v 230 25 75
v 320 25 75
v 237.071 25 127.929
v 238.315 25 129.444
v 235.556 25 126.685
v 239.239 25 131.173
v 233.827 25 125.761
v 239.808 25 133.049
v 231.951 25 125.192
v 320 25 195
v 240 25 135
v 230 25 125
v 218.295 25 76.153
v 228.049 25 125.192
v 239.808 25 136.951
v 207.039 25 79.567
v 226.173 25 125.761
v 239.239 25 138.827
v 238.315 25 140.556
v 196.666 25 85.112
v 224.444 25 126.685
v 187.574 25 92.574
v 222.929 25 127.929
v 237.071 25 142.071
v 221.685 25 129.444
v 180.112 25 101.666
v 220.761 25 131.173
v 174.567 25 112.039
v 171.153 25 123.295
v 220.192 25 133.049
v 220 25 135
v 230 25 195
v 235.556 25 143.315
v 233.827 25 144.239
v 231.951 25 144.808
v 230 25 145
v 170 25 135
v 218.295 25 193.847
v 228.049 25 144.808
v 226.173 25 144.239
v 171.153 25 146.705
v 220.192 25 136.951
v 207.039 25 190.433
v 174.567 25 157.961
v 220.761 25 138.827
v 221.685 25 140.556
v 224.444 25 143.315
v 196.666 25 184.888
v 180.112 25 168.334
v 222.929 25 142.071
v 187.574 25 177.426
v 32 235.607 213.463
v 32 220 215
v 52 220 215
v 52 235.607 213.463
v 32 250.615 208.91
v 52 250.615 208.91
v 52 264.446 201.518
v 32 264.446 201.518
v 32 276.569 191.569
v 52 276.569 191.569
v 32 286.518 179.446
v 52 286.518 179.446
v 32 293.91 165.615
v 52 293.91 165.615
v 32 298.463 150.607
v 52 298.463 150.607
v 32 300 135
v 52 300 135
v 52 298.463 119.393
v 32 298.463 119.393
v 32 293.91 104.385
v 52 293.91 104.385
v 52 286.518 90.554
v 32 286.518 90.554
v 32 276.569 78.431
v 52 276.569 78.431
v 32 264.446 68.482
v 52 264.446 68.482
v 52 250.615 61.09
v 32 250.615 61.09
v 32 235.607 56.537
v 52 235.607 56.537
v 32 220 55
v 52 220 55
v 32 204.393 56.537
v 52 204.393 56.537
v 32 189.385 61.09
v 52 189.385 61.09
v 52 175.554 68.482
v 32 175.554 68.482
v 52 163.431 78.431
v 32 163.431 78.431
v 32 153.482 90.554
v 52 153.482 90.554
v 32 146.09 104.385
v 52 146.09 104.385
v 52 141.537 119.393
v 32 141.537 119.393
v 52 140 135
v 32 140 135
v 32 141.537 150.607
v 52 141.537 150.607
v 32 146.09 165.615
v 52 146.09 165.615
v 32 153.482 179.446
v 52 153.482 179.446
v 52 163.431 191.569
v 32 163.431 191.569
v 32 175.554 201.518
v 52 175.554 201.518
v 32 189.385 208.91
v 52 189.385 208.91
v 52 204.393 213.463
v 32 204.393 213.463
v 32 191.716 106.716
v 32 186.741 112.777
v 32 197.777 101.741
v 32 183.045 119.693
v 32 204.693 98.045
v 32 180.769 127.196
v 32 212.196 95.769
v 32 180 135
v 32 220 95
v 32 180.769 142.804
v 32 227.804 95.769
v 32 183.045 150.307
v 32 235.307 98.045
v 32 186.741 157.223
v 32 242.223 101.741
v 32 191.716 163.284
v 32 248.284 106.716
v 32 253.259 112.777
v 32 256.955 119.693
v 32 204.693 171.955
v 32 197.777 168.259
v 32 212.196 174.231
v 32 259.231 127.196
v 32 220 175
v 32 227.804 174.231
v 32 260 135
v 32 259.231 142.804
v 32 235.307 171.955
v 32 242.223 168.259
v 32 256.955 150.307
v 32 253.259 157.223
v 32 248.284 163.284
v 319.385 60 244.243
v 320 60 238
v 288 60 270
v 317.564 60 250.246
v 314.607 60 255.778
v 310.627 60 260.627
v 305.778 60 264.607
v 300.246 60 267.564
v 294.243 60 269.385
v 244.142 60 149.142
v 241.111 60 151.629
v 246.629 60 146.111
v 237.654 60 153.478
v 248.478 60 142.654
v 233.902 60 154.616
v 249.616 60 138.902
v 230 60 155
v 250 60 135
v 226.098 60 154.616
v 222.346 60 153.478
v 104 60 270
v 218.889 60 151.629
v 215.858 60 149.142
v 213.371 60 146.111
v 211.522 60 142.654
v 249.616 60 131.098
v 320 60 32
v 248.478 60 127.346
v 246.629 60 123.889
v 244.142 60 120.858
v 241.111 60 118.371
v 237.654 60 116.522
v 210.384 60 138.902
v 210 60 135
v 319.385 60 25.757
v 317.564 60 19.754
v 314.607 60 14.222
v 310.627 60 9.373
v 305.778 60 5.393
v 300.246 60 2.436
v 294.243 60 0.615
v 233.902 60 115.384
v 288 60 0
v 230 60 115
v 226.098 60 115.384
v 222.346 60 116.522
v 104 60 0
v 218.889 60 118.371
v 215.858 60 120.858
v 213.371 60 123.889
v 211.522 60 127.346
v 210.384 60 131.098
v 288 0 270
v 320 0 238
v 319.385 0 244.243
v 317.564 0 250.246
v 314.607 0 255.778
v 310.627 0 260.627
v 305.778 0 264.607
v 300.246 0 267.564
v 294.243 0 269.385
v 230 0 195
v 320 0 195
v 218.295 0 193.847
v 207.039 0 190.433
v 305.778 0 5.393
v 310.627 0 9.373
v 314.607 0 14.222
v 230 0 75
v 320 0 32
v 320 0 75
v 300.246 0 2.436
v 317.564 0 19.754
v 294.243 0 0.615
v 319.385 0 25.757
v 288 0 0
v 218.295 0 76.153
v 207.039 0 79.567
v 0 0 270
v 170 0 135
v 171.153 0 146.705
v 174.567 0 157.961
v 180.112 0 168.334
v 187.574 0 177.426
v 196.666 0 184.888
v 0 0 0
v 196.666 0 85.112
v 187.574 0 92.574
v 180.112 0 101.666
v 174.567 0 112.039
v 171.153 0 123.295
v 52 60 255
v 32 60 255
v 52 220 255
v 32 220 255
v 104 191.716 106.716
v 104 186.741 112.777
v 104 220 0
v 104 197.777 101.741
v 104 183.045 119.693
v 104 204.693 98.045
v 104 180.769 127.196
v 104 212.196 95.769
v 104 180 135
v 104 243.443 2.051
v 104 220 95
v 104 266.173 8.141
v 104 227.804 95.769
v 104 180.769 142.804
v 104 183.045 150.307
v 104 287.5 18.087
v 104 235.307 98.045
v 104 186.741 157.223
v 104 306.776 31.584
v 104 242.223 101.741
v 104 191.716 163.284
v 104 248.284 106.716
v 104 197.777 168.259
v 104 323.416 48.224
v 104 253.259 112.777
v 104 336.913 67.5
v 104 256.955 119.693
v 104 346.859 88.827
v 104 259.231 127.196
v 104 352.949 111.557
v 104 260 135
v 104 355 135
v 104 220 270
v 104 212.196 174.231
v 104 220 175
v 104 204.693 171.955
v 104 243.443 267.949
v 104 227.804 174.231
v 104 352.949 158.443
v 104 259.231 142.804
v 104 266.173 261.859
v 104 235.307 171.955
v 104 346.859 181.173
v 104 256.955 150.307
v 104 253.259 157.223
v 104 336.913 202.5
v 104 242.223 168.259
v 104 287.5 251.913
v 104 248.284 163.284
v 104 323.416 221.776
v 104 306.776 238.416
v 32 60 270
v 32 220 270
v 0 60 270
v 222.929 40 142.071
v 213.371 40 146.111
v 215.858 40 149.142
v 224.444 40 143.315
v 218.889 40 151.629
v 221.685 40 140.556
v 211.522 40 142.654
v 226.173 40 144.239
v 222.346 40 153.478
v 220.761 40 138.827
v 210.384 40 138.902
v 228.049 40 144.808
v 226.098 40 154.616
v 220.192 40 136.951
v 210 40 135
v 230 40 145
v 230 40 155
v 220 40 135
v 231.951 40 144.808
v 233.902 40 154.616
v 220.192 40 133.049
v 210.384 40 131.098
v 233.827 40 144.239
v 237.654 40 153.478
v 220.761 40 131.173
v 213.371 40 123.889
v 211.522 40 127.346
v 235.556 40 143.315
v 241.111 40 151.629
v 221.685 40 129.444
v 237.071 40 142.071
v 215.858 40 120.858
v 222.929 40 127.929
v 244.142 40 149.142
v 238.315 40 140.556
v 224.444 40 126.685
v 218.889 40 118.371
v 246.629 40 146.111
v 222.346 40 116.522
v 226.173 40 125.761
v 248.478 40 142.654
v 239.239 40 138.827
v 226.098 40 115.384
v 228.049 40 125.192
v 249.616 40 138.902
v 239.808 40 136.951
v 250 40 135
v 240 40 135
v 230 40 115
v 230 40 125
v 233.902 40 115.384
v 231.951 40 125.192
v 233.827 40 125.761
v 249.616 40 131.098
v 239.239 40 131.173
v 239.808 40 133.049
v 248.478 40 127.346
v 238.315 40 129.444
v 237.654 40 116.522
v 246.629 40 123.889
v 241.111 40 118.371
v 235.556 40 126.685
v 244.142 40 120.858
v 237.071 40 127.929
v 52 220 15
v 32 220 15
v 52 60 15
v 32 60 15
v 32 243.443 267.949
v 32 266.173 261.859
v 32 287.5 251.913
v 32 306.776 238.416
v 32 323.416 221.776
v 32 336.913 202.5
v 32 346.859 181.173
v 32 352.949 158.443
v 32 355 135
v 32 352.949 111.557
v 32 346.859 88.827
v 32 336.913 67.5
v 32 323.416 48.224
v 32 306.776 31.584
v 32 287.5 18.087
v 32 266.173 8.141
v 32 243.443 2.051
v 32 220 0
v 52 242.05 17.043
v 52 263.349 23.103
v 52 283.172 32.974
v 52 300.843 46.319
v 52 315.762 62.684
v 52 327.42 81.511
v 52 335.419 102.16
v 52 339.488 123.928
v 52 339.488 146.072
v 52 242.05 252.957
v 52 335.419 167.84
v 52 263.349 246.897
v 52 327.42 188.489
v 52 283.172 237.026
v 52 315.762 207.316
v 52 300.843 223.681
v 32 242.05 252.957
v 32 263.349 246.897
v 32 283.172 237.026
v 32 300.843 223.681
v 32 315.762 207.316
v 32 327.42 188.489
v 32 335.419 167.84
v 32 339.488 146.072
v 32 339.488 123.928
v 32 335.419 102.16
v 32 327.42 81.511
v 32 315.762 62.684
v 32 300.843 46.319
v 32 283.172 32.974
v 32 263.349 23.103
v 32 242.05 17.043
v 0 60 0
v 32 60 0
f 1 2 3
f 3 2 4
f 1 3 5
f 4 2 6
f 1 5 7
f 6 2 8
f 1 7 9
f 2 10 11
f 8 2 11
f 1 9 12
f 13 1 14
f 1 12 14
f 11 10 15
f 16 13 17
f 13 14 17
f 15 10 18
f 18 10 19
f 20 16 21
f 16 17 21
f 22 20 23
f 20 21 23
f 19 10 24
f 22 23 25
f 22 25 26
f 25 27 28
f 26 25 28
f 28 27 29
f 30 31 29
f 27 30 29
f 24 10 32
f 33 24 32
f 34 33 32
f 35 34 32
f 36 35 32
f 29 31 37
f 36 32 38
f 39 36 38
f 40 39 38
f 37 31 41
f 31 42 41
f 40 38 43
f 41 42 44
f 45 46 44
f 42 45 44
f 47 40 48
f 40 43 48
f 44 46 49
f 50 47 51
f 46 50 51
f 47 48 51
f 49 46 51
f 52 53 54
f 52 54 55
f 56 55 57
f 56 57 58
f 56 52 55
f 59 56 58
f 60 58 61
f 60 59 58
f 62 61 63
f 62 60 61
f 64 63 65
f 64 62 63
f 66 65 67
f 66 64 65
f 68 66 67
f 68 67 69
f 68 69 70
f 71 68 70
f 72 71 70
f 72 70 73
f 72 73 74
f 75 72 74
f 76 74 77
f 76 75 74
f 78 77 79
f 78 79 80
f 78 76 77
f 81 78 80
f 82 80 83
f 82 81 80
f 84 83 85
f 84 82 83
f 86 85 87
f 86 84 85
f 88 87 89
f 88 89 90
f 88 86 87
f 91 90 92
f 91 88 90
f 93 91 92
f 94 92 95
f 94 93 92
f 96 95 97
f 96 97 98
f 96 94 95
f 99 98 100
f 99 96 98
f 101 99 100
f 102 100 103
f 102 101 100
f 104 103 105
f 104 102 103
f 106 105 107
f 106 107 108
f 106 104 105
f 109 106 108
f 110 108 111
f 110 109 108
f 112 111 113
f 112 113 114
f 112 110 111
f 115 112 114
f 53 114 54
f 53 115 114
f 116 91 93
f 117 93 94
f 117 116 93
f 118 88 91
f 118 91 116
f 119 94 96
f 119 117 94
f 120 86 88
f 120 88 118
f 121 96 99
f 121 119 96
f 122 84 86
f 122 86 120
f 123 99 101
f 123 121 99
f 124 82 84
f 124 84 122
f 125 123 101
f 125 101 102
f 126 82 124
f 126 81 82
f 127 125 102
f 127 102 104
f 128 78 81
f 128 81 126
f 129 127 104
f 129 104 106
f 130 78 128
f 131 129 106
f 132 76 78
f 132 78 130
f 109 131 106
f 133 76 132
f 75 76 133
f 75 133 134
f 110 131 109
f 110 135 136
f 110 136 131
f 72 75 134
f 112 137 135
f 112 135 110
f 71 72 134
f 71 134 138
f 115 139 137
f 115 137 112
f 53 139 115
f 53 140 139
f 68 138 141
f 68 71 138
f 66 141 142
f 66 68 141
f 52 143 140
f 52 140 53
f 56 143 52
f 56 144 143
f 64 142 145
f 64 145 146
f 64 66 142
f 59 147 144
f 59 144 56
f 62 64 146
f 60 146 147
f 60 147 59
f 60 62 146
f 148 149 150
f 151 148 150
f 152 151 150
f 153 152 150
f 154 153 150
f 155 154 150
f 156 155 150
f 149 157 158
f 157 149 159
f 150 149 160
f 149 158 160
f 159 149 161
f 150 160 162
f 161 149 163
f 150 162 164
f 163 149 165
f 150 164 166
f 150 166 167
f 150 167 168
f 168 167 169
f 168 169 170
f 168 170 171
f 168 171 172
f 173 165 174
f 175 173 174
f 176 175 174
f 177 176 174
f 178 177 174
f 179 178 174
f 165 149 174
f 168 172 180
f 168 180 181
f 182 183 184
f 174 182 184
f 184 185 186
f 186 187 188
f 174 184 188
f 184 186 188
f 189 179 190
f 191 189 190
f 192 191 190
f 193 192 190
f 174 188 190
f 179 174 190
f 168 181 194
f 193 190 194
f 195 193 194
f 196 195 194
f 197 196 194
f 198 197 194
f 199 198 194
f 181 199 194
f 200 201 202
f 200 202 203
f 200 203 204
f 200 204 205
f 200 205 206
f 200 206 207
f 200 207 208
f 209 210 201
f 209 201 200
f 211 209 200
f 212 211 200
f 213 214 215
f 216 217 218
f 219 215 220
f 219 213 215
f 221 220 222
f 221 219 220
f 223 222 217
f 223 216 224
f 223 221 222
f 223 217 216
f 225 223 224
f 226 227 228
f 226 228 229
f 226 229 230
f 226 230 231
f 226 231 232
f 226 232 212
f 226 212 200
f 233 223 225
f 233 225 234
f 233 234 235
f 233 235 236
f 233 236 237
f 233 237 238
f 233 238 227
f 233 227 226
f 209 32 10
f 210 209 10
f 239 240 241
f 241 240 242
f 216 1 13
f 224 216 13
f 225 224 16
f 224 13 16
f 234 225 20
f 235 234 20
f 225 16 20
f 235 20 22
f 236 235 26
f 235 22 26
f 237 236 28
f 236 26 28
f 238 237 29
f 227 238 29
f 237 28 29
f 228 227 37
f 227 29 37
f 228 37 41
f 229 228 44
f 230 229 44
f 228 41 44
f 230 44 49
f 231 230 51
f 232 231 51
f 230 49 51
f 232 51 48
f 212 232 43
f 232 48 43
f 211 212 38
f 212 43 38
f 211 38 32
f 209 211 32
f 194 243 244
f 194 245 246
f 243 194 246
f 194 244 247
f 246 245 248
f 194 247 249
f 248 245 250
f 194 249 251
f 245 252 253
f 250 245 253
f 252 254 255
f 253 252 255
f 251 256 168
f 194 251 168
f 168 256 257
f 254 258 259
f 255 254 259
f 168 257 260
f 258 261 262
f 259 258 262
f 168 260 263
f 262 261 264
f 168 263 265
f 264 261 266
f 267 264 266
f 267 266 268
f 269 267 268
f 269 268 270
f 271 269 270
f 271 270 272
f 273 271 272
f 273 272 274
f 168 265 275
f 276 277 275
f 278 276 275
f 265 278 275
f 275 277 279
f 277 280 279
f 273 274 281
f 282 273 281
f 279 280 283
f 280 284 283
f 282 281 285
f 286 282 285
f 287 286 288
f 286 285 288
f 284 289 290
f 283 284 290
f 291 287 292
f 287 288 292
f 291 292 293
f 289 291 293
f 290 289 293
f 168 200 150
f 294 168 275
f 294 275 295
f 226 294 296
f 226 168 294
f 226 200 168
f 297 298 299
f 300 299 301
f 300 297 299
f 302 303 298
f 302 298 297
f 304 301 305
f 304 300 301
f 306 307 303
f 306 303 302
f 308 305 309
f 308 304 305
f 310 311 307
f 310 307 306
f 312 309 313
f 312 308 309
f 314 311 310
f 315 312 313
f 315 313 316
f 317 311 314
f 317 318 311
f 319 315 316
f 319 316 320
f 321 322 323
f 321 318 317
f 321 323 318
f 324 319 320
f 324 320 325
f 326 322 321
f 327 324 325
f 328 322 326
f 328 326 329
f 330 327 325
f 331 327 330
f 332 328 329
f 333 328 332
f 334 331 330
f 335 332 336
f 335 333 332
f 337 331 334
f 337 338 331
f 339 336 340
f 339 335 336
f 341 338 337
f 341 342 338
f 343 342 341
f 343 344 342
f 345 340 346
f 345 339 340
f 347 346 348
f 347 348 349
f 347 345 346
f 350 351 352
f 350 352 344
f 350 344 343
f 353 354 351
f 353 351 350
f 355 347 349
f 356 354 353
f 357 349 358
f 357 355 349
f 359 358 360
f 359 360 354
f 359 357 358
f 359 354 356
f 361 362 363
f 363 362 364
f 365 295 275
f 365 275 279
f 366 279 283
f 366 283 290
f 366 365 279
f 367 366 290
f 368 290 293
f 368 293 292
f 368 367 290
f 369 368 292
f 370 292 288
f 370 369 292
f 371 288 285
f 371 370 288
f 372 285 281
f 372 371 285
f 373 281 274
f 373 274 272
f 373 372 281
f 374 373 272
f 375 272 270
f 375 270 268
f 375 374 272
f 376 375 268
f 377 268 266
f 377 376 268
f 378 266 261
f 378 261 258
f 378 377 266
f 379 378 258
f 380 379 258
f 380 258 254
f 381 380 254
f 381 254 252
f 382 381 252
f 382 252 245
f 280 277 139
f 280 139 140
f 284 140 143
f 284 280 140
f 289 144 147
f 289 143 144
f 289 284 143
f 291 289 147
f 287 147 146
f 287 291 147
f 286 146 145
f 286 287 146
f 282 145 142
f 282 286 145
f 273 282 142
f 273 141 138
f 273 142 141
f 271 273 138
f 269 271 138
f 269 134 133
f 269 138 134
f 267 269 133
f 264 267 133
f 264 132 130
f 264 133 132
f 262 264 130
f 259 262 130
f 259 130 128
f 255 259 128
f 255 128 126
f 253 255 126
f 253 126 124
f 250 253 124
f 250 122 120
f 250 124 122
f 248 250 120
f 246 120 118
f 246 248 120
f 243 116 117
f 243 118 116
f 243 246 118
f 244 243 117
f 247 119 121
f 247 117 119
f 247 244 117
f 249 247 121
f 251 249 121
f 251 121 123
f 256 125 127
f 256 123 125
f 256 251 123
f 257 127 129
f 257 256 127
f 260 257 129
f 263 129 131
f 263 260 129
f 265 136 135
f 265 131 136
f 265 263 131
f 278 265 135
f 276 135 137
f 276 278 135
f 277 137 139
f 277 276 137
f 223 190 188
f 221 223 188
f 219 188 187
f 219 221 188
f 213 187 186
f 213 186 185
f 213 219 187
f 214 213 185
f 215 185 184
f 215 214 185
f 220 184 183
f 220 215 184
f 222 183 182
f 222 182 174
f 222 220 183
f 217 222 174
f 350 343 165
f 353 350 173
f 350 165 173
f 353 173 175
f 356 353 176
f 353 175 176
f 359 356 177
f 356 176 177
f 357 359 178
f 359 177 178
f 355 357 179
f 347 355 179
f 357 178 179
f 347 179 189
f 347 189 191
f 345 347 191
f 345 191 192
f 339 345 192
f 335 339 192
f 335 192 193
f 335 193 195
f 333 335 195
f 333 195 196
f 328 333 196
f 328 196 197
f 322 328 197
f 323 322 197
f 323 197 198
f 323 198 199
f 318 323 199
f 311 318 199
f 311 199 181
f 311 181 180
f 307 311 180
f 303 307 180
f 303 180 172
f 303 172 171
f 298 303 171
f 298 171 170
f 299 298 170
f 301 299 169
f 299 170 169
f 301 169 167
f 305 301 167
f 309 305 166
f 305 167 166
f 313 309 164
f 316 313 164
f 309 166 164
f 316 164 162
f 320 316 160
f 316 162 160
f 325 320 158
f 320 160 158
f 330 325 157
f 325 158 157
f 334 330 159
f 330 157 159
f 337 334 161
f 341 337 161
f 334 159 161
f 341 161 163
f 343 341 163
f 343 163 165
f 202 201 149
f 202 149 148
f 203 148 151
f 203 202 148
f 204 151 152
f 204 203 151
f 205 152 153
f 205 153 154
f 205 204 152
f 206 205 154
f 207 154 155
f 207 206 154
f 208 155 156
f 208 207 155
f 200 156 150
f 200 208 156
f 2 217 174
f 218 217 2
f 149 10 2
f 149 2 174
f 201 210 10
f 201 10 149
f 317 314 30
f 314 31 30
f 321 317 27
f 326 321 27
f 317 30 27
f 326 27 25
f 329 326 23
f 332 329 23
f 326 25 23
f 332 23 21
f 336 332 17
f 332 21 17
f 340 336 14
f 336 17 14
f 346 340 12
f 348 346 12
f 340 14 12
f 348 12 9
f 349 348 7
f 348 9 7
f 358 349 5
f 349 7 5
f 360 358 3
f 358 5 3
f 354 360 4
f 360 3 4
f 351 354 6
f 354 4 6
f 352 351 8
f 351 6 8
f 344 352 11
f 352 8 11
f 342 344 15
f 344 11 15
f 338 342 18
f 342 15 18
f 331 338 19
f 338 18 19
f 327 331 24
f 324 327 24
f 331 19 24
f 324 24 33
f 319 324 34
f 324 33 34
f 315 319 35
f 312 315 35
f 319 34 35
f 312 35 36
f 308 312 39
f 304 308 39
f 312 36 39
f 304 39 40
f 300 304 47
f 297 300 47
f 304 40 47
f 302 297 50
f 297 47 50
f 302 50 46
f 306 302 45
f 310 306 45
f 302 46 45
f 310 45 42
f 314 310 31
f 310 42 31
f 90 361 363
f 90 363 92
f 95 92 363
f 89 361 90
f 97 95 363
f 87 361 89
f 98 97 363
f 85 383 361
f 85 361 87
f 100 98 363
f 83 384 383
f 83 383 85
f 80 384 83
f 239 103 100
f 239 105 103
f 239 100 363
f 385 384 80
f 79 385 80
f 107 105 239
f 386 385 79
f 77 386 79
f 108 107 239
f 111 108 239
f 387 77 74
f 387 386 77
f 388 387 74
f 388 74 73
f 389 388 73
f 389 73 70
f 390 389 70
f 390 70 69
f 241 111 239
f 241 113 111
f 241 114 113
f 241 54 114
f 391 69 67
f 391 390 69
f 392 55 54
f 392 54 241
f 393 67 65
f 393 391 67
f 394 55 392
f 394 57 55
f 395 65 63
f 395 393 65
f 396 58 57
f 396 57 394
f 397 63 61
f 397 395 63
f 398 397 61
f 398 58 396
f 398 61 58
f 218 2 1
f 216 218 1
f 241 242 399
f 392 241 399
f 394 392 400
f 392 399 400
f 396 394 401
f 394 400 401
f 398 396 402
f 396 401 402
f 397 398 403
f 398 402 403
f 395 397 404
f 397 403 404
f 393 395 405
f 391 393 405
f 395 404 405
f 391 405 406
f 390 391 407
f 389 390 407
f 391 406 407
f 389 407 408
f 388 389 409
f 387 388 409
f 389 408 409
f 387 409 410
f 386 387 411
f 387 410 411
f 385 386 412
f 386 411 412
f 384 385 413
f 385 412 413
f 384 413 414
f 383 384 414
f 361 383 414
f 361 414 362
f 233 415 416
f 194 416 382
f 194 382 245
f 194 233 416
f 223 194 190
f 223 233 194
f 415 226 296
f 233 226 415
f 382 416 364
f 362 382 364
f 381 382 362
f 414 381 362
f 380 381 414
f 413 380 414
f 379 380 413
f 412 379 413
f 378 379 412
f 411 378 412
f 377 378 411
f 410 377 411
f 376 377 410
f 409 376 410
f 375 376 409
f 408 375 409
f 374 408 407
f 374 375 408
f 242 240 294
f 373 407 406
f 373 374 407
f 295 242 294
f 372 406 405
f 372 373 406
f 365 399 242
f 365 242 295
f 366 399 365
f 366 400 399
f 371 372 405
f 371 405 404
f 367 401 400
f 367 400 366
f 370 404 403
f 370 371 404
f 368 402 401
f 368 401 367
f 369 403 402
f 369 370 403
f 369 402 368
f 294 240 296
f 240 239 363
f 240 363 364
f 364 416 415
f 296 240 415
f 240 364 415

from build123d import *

# Parameters (mm, degrees)
EXTRUDE_1_DEPTH           = 60
CUT_EXTRUDE_1_DEPTH       = 423.965719651
CUT_EXTRUDE_1_DEPTH_BACK  = 25
HOLE_WIZARD_1_D           = 20
HOLE_WIZARD_1_CBORE_D     = 40
HOLE_WIZARD_1_CBORE_DEPTH = 20
EXTRUDE_START             = -32
EXTRUDE_3_DEPTH           = 72
CUT_EXTRUDE_3_DEPTH       = 531.913363931
CUT_EXTRUDE_3_DEPTH_BACK  = 531.913363931
SKETCH_10_R               = 40
SKETCH_12_R               = 80
CUT_EXTRUDE_5_DEPTH       = 20


with BuildPart() as part:
    # 草图1 → 凸台-拉伸1 (new body)
    with BuildSketch(Plane(origin=(0, 0, 0), x_dir=(1, 0, 0), z_dir=(0, 1, 0))):
        with BuildLine():
            Line((0, 0), (288, 0))
            ThreePointArc((288, 0), (310.627416998, -9.372583002), (320, -32))
            Line((320, -32), (320, -238))
            ThreePointArc((320, -238), (310.627416998, -260.627416998), (288, -270))
            Line((288, -270), (0, -270))
            Line((0, -270), (0, 0))
        make_face()
    extrude(amount=EXTRUDE_1_DEPTH)

    # 草图2 → 切除-拉伸1 (cut, two sides: drawn at the far end of the back side and taken through both)
    with BuildSketch(Plane.XZ.offset(-CUT_EXTRUDE_1_DEPTH_BACK)):
        with BuildLine():
            Line((230, 195), (320, 195))
            Line((320, 195), (320, 75))
            Line((320, 75), (230, 75))
            ThreePointArc((230, 75), (170, 135), (230, 195))
        make_face()
    extrude(amount=CUT_EXTRUDE_1_DEPTH + CUT_EXTRUDE_1_DEPTH_BACK, mode=Mode.SUBTRACT)

    # 孔1 (through all)
    with Locations(Plane(origin=(0, 60, 0), x_dir=(1, 0, 0), z_dir=(0, 1, 0))):
        with Locations((230, -135)):
            CounterBoreHole(HOLE_WIZARD_1_D / 2, HOLE_WIZARD_1_CBORE_D / 2, HOLE_WIZARD_1_CBORE_DEPTH)

    # 草图8 → 凸台-拉伸3 (add)
    with BuildSketch(Plane.ZY.offset(EXTRUDE_START)):
        with BuildLine():
            Line((0, 60), (270, 60))
            Line((270, 60), (270, 220))
            ThreePointArc((270, 220), (135, 355), (0, 220))
            Line((0, 220), (0, 60))
        make_face()
    extrude(amount=-EXTRUDE_3_DEPTH)

    # 草图10 → 切除-拉伸3 (cut, two sides: drawn at the far end of the back side and taken through both)
    with BuildSketch(Plane.ZY.offset(-32).offset(-CUT_EXTRUDE_3_DEPTH_BACK)):
        with Locations((135, 220)):
            Circle(SKETCH_10_R)
    extrude(amount=CUT_EXTRUDE_3_DEPTH + CUT_EXTRUDE_3_DEPTH_BACK, mode=Mode.SUBTRACT)

    # 草图12 → 切除-拉伸5 (cut)
    with BuildSketch(Plane.ZY.offset(-32)):
        with BuildLine():
            Line((255, 60), (255, 220))
            ThreePointArc((255, 220), (135, 340), (15, 220))
            Line((15, 220), (15, 60))
            Line((15, 60), (255, 60))
        make_face()
        with Locations((135, 220)):
            Circle(SKETCH_12_R, mode=Mode.SUBTRACT)
    extrude(amount=-CUT_EXTRUDE_5_DEPTH, mode=Mode.SUBTRACT)


solid = part.part
